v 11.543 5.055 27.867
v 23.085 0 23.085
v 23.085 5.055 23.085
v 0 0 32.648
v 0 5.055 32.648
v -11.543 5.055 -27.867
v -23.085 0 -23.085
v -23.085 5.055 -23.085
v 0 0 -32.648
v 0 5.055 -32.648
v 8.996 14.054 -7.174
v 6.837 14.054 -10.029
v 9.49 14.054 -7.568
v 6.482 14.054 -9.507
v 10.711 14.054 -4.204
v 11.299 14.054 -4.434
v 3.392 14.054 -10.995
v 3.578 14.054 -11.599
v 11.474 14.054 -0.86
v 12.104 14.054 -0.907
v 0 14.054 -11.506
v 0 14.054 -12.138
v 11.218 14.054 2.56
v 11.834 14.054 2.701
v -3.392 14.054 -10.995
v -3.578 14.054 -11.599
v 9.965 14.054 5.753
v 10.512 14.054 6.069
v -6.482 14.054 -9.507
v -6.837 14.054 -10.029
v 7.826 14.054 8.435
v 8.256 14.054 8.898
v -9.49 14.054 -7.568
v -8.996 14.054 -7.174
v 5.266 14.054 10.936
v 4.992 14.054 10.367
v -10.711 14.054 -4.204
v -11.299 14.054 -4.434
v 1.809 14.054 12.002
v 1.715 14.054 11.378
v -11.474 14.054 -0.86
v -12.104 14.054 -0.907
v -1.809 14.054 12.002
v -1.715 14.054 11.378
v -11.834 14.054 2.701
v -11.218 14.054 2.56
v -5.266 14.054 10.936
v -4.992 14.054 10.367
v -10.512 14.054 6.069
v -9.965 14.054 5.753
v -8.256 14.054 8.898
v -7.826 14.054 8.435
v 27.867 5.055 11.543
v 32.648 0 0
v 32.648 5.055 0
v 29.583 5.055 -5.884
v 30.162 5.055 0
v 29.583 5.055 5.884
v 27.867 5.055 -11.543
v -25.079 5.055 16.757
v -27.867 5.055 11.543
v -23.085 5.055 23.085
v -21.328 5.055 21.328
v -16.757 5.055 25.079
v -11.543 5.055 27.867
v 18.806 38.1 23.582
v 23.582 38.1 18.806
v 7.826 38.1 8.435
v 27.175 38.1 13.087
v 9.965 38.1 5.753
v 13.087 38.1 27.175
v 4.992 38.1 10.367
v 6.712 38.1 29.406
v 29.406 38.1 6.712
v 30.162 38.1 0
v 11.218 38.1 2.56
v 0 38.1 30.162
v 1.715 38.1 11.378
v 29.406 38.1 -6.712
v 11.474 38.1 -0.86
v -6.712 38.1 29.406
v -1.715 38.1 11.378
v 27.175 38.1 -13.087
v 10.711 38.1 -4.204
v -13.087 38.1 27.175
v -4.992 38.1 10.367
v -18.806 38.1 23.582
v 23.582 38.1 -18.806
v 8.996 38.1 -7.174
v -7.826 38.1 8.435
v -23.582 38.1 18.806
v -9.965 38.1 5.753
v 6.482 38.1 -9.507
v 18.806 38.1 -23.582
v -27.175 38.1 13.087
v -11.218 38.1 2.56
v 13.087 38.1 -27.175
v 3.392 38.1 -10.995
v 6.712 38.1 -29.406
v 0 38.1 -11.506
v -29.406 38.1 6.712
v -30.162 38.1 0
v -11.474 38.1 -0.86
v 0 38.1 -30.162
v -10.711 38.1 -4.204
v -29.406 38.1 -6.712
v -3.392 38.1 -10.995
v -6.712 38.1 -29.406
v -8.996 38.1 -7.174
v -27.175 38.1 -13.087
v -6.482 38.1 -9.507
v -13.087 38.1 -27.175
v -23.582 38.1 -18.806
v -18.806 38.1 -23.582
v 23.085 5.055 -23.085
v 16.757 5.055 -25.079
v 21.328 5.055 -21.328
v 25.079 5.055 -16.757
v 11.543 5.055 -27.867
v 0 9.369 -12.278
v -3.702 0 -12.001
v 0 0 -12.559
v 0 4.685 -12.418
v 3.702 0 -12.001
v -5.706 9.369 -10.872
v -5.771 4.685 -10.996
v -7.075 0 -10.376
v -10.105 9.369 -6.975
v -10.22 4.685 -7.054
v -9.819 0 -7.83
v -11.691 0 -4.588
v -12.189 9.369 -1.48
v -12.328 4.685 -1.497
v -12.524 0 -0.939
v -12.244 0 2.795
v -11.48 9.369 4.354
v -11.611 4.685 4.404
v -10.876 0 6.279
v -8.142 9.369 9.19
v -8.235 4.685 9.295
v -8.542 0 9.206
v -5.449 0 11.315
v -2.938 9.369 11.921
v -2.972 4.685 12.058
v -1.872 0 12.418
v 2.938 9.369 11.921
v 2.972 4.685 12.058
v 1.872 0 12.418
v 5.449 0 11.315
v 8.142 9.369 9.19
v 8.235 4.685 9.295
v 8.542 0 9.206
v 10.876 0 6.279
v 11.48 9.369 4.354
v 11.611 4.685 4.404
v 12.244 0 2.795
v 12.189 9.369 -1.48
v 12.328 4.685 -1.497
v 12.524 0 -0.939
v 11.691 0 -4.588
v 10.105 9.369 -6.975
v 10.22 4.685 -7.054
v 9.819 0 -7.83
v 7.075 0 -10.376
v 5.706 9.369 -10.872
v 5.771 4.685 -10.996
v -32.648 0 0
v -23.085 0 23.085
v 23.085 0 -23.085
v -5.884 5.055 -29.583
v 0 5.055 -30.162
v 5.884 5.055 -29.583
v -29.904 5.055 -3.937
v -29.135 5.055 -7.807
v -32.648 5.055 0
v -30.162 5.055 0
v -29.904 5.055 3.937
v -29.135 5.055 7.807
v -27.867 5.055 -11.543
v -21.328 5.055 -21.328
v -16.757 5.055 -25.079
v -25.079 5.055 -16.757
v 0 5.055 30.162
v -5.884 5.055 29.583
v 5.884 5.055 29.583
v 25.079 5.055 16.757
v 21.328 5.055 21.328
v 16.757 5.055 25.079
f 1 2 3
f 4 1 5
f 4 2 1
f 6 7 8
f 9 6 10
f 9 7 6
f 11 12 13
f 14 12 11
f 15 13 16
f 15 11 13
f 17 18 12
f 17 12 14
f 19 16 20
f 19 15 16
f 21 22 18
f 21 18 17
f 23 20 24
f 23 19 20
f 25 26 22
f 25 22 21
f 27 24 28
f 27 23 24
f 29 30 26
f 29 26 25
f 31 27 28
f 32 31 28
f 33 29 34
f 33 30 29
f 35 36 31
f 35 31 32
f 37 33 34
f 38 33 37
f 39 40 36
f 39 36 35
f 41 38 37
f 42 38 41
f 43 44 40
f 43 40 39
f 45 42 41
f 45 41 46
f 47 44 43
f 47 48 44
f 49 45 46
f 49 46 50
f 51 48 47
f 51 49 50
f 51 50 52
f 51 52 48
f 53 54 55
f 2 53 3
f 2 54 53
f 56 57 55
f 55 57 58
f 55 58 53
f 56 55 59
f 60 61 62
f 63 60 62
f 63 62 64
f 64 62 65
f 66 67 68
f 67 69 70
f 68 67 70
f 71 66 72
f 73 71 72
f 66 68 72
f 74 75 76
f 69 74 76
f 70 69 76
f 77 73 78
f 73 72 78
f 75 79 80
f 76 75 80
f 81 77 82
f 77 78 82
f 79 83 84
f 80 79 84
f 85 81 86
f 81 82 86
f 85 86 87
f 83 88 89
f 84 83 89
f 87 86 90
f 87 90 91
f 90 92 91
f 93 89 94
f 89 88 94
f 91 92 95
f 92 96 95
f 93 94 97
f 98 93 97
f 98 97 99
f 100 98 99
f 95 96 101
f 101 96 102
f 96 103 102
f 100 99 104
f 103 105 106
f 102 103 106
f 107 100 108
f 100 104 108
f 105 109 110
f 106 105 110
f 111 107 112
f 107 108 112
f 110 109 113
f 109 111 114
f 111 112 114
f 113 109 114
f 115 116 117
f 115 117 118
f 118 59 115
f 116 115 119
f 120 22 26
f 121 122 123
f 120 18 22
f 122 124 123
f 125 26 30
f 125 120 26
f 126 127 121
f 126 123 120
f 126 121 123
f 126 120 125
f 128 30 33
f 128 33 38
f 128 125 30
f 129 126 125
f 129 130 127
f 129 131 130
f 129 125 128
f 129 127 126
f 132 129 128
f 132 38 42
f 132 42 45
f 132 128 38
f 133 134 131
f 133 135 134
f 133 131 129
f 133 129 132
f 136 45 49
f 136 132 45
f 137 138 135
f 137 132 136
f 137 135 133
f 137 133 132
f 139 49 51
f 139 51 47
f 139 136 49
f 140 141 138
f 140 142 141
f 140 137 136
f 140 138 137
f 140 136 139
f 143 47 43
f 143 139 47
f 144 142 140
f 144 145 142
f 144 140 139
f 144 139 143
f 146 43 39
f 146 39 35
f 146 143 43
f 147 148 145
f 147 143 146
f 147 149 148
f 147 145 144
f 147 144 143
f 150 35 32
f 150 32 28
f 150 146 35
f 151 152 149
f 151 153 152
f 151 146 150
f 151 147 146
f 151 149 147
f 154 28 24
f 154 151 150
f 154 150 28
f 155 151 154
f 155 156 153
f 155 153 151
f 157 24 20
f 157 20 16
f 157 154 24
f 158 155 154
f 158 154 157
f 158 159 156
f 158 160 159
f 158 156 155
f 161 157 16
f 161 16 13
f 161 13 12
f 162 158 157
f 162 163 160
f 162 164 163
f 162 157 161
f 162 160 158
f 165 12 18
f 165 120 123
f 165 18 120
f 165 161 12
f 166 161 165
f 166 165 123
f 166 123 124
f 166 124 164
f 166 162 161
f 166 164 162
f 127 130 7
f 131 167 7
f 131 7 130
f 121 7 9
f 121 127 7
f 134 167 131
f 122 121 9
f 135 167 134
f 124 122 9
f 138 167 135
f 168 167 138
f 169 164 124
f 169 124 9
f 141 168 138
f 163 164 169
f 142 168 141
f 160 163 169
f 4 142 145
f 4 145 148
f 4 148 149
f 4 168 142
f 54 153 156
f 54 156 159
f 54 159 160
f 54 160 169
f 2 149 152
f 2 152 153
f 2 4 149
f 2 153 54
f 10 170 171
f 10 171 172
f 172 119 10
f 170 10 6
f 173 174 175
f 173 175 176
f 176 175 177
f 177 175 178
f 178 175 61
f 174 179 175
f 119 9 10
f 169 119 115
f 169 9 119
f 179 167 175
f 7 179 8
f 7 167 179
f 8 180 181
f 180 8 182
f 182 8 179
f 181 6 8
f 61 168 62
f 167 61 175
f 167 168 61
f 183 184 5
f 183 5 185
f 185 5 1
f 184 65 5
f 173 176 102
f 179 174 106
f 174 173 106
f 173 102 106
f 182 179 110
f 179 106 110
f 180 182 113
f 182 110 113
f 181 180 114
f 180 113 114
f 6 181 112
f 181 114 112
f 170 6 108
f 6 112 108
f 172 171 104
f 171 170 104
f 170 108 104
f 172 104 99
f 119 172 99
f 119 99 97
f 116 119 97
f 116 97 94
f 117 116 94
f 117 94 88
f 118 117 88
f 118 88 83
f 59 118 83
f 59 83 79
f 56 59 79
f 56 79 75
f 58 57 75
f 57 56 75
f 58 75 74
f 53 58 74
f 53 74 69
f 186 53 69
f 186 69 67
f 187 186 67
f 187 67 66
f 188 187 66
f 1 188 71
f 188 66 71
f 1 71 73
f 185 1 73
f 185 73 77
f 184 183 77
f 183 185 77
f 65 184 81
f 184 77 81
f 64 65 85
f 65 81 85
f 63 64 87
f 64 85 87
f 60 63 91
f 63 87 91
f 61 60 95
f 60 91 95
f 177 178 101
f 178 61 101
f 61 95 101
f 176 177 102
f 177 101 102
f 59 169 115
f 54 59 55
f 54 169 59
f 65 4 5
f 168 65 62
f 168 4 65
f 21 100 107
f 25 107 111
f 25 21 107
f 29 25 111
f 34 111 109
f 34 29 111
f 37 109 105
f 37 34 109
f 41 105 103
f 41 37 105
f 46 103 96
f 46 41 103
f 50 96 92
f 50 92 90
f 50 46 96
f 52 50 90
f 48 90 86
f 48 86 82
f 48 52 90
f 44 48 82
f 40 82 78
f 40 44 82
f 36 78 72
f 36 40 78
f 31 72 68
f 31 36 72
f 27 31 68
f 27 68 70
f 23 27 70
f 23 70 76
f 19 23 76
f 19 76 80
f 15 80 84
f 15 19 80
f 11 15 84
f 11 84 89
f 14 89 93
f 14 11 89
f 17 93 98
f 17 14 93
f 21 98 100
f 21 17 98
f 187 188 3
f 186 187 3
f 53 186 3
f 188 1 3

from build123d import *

# Parameters (mm, degrees)
SKETCH1_W           = 30.1625
SKETCH1_H           = 38.1
BOSS_EXTRUDE1_DEPTH = 5.0546


with BuildPart() as part:
    # Sketch1 → Revolve1 (revolve)
    with BuildSketch(Plane.XY):
        with Locations((-15.08125, 19.05)):
            Rectangle(SKETCH1_W, SKETCH1_H)
    revolve(axis=Axis((0, 0, 0), (0, -1, 0)))

    # Sketch2 → Boss-Extrude1 (add)
    with BuildSketch(Plane.XZ):
        Polygon((0, 32.647654741), (-23.085378057, 23.085378057), (-32.647654741, 0), (-23.085378057, -23.085378057), (0, -32.647654741), (23.085378057, -23.085378057), (32.647654741, 0), (23.085378057, 23.085378057), align=None)
    extrude(amount=-BOSS_EXTRUDE1_DEPTH)

    # Sketch4 → 3/4 NPT Tapped Hole1 (revolve, cut)
    with BuildSketch(Plane(origin=(0, 0, 0), x_dir=(0, 0, -1), z_dir=(1, 0, 0))):
        Polygon((0, 0), (0, 38.1), (11.5062, 38.1), (11.5062, 14.05382), (12.137858809, 14.05382), (12.558649, 0), align=None)
    revolve(axis=Axis((0, -6.35, 0), (0, 1, 0)), mode=Mode.SUBTRACT)


solid = part.part
